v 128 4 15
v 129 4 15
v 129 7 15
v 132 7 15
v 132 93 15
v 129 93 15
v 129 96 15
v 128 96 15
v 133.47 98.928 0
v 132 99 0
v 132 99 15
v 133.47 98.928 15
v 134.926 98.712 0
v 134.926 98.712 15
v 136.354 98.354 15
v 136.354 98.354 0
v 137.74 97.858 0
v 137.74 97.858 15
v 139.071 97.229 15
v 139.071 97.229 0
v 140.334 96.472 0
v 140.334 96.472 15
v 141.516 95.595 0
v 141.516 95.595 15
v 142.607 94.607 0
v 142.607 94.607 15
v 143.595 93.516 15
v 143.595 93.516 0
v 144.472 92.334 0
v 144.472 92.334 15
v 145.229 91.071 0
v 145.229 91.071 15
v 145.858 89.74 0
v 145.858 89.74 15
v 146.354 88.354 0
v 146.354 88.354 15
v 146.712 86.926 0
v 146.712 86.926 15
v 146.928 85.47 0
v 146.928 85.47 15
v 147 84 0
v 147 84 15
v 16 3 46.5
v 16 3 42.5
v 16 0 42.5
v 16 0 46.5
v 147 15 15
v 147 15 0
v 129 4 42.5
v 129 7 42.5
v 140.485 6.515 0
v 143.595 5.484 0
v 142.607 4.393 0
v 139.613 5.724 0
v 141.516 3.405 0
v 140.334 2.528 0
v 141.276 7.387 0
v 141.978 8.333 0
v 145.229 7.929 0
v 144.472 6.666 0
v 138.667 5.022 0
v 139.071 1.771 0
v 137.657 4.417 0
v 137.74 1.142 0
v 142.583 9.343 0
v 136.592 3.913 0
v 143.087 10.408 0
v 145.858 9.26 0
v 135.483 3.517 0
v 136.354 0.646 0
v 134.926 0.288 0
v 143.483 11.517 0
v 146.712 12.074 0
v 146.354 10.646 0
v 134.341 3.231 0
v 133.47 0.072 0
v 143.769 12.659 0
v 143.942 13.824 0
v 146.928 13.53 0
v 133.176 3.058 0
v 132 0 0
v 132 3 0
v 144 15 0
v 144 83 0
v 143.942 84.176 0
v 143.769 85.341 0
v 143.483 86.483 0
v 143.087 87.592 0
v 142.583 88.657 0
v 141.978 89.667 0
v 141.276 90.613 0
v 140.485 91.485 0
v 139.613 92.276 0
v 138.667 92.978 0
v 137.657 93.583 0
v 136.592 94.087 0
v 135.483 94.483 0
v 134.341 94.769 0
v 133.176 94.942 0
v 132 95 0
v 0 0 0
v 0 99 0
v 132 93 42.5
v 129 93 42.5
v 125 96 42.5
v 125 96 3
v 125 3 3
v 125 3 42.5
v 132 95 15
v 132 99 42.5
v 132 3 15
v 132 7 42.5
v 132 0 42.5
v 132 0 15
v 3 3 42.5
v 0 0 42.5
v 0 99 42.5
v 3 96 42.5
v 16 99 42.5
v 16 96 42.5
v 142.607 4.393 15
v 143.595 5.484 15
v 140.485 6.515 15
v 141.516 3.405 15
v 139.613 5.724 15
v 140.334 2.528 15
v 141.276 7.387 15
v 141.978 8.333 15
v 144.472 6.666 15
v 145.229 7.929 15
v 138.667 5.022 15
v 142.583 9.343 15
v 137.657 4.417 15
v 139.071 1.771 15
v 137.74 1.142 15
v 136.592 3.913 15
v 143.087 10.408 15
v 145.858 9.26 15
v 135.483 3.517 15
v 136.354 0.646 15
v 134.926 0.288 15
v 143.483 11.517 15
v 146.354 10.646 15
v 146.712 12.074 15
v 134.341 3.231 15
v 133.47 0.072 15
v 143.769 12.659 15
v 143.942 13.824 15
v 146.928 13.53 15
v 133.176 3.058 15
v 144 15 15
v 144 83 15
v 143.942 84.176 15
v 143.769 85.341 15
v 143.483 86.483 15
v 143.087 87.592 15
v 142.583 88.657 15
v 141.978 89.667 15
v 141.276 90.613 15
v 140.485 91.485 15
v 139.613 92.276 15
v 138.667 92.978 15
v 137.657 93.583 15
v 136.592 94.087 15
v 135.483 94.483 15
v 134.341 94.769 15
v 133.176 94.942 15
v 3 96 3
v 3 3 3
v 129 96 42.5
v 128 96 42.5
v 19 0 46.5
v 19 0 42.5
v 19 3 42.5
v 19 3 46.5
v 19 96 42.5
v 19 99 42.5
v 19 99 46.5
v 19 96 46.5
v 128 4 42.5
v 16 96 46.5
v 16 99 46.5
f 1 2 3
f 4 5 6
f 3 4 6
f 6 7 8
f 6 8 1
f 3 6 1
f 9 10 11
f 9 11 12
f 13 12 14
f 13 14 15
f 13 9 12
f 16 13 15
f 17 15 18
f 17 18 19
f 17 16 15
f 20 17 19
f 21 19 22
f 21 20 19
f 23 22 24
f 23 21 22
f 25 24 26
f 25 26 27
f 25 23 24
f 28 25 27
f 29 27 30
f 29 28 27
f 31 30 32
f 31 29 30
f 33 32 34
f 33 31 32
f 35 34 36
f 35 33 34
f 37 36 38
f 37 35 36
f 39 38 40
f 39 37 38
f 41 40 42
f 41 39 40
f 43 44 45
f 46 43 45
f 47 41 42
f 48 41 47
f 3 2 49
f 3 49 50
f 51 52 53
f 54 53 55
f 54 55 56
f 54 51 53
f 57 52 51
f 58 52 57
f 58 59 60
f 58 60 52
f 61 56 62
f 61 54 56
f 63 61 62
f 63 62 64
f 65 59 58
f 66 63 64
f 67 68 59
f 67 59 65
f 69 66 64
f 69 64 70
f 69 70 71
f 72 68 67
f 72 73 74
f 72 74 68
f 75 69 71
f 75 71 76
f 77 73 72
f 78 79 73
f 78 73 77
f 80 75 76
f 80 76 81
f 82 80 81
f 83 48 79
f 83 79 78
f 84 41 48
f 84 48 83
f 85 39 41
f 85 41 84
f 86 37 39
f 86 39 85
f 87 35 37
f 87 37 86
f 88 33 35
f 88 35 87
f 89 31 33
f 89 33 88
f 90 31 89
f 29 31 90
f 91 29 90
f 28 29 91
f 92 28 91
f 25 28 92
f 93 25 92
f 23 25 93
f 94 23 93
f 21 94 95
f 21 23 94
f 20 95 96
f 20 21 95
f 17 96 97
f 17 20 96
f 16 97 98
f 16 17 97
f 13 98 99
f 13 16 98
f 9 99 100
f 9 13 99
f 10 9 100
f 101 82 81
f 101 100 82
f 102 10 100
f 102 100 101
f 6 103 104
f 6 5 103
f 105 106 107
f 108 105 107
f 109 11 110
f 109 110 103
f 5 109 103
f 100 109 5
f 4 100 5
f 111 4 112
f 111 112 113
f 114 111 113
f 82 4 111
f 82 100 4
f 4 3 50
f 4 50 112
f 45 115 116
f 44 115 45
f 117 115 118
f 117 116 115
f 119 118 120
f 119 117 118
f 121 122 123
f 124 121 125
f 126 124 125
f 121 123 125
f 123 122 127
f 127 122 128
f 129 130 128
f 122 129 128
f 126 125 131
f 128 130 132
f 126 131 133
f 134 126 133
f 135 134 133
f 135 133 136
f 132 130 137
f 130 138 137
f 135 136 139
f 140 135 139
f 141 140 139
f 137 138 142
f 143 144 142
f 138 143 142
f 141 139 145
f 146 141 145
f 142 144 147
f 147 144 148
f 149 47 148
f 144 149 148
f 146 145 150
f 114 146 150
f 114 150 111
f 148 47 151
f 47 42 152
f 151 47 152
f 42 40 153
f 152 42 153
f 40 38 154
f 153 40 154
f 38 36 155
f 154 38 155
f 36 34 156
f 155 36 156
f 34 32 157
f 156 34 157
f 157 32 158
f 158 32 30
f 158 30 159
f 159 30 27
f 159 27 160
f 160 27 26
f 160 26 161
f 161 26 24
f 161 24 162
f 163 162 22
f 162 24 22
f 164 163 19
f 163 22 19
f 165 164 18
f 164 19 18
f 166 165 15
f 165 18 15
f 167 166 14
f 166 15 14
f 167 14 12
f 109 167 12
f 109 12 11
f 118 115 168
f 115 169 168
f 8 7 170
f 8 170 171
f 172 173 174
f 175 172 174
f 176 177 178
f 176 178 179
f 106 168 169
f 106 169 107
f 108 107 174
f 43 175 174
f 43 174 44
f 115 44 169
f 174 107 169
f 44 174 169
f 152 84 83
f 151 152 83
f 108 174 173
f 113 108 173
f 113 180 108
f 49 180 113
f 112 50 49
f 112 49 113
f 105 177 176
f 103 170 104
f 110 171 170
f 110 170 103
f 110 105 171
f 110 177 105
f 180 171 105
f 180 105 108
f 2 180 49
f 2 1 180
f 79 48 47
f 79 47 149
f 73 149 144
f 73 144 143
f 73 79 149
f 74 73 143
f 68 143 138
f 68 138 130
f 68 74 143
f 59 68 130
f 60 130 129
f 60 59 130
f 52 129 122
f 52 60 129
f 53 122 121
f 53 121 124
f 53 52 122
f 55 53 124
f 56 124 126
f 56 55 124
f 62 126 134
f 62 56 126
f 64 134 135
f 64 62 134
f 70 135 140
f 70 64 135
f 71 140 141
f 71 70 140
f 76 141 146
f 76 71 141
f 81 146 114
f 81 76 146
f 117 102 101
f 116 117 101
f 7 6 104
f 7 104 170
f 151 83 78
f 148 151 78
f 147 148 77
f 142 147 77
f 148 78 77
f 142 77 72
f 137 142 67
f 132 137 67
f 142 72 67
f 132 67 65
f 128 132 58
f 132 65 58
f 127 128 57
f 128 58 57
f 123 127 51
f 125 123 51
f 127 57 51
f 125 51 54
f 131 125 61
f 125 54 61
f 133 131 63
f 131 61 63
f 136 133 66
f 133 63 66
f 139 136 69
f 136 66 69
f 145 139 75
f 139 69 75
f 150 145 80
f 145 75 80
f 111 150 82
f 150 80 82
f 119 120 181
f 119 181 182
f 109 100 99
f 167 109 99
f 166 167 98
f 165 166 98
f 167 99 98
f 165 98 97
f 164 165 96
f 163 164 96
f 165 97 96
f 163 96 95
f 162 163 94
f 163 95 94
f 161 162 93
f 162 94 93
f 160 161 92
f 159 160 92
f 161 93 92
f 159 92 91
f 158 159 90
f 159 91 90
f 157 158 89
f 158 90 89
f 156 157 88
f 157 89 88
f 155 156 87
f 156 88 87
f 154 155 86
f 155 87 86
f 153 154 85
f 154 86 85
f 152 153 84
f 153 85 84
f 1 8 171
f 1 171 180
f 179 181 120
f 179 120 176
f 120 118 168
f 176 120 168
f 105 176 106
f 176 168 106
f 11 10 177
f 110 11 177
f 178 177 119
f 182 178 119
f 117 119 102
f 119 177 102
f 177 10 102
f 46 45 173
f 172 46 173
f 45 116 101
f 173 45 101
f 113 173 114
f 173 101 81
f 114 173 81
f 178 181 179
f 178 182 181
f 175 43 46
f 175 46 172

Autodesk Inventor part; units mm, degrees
ref_plane "YZ Plane" through (0, 0, 0) normal (1, 0, 0) x (0, 1, 0)
ref_plane "XZ Plane" through (0, 0, 0) normal (0, 1, 0) x (-1, 0, 0)
ref_plane "XY Plane" through (0, 0, 0) normal (0, 0, 1) x (1, 0, 0)
sketch "Sketch1" plane through (0, 0, 0) normal (0, 0, 1) x (1, 0, 0)
  line L0 (0, 0) -> (132, 0)
  line L1 (0, 0) -> (132, 0)
  line L2 (0, 0) -> (132, 0)
  line L3 (132, 0) -> (132, 99)
  line L4 (132, 99) -> (0, 99)
  line L5 (0, 99) -> (0, 0)
  dimension "d12" = 132
  dimension "d13" = 99
extrude "Extrusion2" add sketch "Sketch1" along normal blind 3
sketch "Sketch2" plane through (0, 0, 3) normal (0, 0, 1) x (1, 0, 0)
  line L0 (3, 96) -> (125, 96)
  line L1 (125, 96) -> (125, 3)
  line L2 (125, 3) -> (3, 3)
  line L3 (3, 3) -> (3, 96)
  line L4 (132, 99) -> (0, 99) projected
  line L5 (0, 0) -> (132, 0) projected
  line L6 (0, 99) -> (0, 0) projected
  line L7 (132, 0) -> (132, 99) projected
  dimension "d16" = 3
  dimension "d17" = 3
  dimension "d18" = 3
  dimension "d21" = 7
extrude "Extrusion3" add sketch "Sketch2" along normal blind 12
sketch "Sketch3" plane through (0, 0, 0) normal (0, 0, -1) x (-1, 0, 0)
  point P0 (0, 0)
sketch "Sketch4" plane through (0, 0, 0) normal (0, 0, -1) x (-1, 0, 0)
  line L0 (-132, 99) -> (0, 99) projected
  line L1 (-132, 99) -> (-132, 84)
  line L2 (-132, 0) -> (-132, 99) projected
  line L3 (-132, 0) -> (-132, 15)
  arc A0 (-147, 15) -> (-132, 0) centre (-132, 15) ccw
  line L4 (-132, 15) -> (-147, 15) construction
  line L5 (-132, 15) -> (-132, 0) construction
  arc A1 (-132, 99) -> (-147, 84) centre (-132, 84) ccw
  line L6 (-132, 84) -> (-147, 84) construction
  line L7 (-132, 84) -> (-132, 99) construction
  line L8 (-147, 84) -> (-147, 15)
  point P0 (0, 0)
  dimension "d24" = 15
  dimension "d25" = 15
  dimension "d26" = 90
  dimension "d27" = 90
extrude "Extrusion4" add sketch "Sketch4" against normal blind 15
sketch "Sketch5" plane through (0, 0, 0) normal (0, 0, -1) x (-1, 0, 0)
  line L0 (-132, 99) -> (0, 99) projected
  line L1 (0, 0) -> (-132, 0) projected
  arc A0 (-132, 95) -> (-144, 83) centre (-132, 83) ccw
  arc A1 (-144, 15) -> (-132, 3) centre (-132, 15) ccw
  line L2 (-144, 83) -> (-144, 15)
  line L3 (-132, 95) -> (-132, 3)
  dimension "d35" = 3
  dimension "d36" = 92
  dimension "d37" = 3
extrude "Extrusion5" cut sketch "Sketch5" against normal through all
sketch "Sketch6" plane through (0, 0, 15) normal (0, 0, 1) x (1, 0, 0)
  line L0 (132, 99) -> (0, 99) projected
  arc A0 (147, 84) -> (132, 99) centre (132, 84) ccw projected
  line L1 (0, 99) -> (132, 99)
  line L2 (132, 99) -> (132, 93)
  line L3 (132, 3) -> (132, 95) projected
  line L4 (132, 93) -> (129, 93)
  line L5 (129, 93) -> (129, 96)
  line L6 (129, 96) -> (128, 96)
  line L7 (128, 96) -> (128, 4)
  line L8 (125, 96) -> (125, 3) projected
  line L9 (128, 4) -> (129, 4)
  line L10 (129, 4) -> (129, 7)
  line L11 (129, 7) -> (132, 7)
  line L12 (132, 7) -> (132, 0)
  line L13 (0, 0) -> (132, 0) projected
  line L14 (132, 0) -> (0, 0)
  line L15 (0, 99) -> (0, 0) projected
  line L16 (0, 0) -> (0, 99)
  line L17 (3, 96) -> (125, 96) projected
  line L18 (3, 96) -> (125, 96)
  line L19 (125, 96) -> (125, 3)
  line L20 (125, 3) -> (3, 3)
  line L21 (3, 3) -> (3, 96)
  dimension "d40" = 6
  dimension "d41" = 3
  dimension "d42" = 3
  dimension "d43" = 1
  dimension "d44" = 3
  dimension "d45" = 3
extrude "Extrusion6" add sketch "Sketch6" along normal blind 27.5 contours L2 L4 L5 L6 L7 L9 L10 L11 L3 L12 L13 L15 L0
sketch "Sketch7" plane through (0, 0, 42.5) normal (0, 0, 1) x (1, 0, 0)
  line L0 (0, 99) -> (0, 0) projected
  line L1 (0, 0) -> (16, 0)
  line L2 (0, 0) -> (132, 0) projected
  line L3 (3, 3) -> (125, 3) projected
  line L4 (16, 0) -> (19, 0)
  line L5 (19, 0) -> (19, 3)
  line L6 (19, 3) -> (16, 3)
  line L7 (16, 3) -> (16, 0)
  line L8 (0, 99) -> (16, 99)
  line L9 (132, 99) -> (0, 99) projected
  line L10 (125, 96) -> (3, 96) projected
  line L11 (16, 99) -> (19, 99)
  line L12 (19, 99) -> (19, 96)
  line L13 (19, 96) -> (16, 96)
  line L14 (16, 96) -> (16, 99)
  dimension "d48" = 16
  dimension "d49" = 3
  dimension "d50" = 16
  dimension "d51" = 3
extrude "Extrusion7" add sketch "Sketch7" along normal blind 4
sketch "Sketch10" plane through (0, 0, 0) normal (0, -1, 0) x (1, 0, 0)
  line L0 (132, 42.5) -> (19, 42.5) projected
  line L1 (19, 42.5) -> (22, 42.5)
  line L2 (22, 3) -> (22, 0)
  line L3 (0, 0) -> (132, 0) projected
  line L4 (0, 0) -> (0, 22)
  line L5 (0, 0) -> (0, 42.5) projected
  line L6 (0, 22) -> (3, 22)
  arc A0 (0, 22) -> (22, 0) centre (22, 22) ccw
  line L7 (125, 3) -> (3, 3) projected
  arc A1 (3, 22) -> (22, 3) centre (22, 22) ccw
  line L8 (19, 3.2383) -> (19, 3)
  line L9 (19, 0.2055) -> (19, 0)
  dimension "d70" = 3
  dimension "d73" = 22
  dimension "d74" = 3
  dimension "d75" = 3
  dimension "d76" = 19
equation "\"d16\" = d17"
equation "\"d18\" = d17"
equation "\"d25\" = d24"
equation "\"d35\" = d17"
equation "\"d37\" = d17"
equation "\"d41\" = d17"
equation "\"d42\" = d17"
equation "\"d44\" = d17"
equation "\"d45\" = d17"
equation "\"d49\" = d17"
equation "\"d51\" = d17"
equation "\"d70\" = d17"
equation "\"d74\" = d17"
equation "\"d75\" = d17"
properties part number "boxMVer1"
